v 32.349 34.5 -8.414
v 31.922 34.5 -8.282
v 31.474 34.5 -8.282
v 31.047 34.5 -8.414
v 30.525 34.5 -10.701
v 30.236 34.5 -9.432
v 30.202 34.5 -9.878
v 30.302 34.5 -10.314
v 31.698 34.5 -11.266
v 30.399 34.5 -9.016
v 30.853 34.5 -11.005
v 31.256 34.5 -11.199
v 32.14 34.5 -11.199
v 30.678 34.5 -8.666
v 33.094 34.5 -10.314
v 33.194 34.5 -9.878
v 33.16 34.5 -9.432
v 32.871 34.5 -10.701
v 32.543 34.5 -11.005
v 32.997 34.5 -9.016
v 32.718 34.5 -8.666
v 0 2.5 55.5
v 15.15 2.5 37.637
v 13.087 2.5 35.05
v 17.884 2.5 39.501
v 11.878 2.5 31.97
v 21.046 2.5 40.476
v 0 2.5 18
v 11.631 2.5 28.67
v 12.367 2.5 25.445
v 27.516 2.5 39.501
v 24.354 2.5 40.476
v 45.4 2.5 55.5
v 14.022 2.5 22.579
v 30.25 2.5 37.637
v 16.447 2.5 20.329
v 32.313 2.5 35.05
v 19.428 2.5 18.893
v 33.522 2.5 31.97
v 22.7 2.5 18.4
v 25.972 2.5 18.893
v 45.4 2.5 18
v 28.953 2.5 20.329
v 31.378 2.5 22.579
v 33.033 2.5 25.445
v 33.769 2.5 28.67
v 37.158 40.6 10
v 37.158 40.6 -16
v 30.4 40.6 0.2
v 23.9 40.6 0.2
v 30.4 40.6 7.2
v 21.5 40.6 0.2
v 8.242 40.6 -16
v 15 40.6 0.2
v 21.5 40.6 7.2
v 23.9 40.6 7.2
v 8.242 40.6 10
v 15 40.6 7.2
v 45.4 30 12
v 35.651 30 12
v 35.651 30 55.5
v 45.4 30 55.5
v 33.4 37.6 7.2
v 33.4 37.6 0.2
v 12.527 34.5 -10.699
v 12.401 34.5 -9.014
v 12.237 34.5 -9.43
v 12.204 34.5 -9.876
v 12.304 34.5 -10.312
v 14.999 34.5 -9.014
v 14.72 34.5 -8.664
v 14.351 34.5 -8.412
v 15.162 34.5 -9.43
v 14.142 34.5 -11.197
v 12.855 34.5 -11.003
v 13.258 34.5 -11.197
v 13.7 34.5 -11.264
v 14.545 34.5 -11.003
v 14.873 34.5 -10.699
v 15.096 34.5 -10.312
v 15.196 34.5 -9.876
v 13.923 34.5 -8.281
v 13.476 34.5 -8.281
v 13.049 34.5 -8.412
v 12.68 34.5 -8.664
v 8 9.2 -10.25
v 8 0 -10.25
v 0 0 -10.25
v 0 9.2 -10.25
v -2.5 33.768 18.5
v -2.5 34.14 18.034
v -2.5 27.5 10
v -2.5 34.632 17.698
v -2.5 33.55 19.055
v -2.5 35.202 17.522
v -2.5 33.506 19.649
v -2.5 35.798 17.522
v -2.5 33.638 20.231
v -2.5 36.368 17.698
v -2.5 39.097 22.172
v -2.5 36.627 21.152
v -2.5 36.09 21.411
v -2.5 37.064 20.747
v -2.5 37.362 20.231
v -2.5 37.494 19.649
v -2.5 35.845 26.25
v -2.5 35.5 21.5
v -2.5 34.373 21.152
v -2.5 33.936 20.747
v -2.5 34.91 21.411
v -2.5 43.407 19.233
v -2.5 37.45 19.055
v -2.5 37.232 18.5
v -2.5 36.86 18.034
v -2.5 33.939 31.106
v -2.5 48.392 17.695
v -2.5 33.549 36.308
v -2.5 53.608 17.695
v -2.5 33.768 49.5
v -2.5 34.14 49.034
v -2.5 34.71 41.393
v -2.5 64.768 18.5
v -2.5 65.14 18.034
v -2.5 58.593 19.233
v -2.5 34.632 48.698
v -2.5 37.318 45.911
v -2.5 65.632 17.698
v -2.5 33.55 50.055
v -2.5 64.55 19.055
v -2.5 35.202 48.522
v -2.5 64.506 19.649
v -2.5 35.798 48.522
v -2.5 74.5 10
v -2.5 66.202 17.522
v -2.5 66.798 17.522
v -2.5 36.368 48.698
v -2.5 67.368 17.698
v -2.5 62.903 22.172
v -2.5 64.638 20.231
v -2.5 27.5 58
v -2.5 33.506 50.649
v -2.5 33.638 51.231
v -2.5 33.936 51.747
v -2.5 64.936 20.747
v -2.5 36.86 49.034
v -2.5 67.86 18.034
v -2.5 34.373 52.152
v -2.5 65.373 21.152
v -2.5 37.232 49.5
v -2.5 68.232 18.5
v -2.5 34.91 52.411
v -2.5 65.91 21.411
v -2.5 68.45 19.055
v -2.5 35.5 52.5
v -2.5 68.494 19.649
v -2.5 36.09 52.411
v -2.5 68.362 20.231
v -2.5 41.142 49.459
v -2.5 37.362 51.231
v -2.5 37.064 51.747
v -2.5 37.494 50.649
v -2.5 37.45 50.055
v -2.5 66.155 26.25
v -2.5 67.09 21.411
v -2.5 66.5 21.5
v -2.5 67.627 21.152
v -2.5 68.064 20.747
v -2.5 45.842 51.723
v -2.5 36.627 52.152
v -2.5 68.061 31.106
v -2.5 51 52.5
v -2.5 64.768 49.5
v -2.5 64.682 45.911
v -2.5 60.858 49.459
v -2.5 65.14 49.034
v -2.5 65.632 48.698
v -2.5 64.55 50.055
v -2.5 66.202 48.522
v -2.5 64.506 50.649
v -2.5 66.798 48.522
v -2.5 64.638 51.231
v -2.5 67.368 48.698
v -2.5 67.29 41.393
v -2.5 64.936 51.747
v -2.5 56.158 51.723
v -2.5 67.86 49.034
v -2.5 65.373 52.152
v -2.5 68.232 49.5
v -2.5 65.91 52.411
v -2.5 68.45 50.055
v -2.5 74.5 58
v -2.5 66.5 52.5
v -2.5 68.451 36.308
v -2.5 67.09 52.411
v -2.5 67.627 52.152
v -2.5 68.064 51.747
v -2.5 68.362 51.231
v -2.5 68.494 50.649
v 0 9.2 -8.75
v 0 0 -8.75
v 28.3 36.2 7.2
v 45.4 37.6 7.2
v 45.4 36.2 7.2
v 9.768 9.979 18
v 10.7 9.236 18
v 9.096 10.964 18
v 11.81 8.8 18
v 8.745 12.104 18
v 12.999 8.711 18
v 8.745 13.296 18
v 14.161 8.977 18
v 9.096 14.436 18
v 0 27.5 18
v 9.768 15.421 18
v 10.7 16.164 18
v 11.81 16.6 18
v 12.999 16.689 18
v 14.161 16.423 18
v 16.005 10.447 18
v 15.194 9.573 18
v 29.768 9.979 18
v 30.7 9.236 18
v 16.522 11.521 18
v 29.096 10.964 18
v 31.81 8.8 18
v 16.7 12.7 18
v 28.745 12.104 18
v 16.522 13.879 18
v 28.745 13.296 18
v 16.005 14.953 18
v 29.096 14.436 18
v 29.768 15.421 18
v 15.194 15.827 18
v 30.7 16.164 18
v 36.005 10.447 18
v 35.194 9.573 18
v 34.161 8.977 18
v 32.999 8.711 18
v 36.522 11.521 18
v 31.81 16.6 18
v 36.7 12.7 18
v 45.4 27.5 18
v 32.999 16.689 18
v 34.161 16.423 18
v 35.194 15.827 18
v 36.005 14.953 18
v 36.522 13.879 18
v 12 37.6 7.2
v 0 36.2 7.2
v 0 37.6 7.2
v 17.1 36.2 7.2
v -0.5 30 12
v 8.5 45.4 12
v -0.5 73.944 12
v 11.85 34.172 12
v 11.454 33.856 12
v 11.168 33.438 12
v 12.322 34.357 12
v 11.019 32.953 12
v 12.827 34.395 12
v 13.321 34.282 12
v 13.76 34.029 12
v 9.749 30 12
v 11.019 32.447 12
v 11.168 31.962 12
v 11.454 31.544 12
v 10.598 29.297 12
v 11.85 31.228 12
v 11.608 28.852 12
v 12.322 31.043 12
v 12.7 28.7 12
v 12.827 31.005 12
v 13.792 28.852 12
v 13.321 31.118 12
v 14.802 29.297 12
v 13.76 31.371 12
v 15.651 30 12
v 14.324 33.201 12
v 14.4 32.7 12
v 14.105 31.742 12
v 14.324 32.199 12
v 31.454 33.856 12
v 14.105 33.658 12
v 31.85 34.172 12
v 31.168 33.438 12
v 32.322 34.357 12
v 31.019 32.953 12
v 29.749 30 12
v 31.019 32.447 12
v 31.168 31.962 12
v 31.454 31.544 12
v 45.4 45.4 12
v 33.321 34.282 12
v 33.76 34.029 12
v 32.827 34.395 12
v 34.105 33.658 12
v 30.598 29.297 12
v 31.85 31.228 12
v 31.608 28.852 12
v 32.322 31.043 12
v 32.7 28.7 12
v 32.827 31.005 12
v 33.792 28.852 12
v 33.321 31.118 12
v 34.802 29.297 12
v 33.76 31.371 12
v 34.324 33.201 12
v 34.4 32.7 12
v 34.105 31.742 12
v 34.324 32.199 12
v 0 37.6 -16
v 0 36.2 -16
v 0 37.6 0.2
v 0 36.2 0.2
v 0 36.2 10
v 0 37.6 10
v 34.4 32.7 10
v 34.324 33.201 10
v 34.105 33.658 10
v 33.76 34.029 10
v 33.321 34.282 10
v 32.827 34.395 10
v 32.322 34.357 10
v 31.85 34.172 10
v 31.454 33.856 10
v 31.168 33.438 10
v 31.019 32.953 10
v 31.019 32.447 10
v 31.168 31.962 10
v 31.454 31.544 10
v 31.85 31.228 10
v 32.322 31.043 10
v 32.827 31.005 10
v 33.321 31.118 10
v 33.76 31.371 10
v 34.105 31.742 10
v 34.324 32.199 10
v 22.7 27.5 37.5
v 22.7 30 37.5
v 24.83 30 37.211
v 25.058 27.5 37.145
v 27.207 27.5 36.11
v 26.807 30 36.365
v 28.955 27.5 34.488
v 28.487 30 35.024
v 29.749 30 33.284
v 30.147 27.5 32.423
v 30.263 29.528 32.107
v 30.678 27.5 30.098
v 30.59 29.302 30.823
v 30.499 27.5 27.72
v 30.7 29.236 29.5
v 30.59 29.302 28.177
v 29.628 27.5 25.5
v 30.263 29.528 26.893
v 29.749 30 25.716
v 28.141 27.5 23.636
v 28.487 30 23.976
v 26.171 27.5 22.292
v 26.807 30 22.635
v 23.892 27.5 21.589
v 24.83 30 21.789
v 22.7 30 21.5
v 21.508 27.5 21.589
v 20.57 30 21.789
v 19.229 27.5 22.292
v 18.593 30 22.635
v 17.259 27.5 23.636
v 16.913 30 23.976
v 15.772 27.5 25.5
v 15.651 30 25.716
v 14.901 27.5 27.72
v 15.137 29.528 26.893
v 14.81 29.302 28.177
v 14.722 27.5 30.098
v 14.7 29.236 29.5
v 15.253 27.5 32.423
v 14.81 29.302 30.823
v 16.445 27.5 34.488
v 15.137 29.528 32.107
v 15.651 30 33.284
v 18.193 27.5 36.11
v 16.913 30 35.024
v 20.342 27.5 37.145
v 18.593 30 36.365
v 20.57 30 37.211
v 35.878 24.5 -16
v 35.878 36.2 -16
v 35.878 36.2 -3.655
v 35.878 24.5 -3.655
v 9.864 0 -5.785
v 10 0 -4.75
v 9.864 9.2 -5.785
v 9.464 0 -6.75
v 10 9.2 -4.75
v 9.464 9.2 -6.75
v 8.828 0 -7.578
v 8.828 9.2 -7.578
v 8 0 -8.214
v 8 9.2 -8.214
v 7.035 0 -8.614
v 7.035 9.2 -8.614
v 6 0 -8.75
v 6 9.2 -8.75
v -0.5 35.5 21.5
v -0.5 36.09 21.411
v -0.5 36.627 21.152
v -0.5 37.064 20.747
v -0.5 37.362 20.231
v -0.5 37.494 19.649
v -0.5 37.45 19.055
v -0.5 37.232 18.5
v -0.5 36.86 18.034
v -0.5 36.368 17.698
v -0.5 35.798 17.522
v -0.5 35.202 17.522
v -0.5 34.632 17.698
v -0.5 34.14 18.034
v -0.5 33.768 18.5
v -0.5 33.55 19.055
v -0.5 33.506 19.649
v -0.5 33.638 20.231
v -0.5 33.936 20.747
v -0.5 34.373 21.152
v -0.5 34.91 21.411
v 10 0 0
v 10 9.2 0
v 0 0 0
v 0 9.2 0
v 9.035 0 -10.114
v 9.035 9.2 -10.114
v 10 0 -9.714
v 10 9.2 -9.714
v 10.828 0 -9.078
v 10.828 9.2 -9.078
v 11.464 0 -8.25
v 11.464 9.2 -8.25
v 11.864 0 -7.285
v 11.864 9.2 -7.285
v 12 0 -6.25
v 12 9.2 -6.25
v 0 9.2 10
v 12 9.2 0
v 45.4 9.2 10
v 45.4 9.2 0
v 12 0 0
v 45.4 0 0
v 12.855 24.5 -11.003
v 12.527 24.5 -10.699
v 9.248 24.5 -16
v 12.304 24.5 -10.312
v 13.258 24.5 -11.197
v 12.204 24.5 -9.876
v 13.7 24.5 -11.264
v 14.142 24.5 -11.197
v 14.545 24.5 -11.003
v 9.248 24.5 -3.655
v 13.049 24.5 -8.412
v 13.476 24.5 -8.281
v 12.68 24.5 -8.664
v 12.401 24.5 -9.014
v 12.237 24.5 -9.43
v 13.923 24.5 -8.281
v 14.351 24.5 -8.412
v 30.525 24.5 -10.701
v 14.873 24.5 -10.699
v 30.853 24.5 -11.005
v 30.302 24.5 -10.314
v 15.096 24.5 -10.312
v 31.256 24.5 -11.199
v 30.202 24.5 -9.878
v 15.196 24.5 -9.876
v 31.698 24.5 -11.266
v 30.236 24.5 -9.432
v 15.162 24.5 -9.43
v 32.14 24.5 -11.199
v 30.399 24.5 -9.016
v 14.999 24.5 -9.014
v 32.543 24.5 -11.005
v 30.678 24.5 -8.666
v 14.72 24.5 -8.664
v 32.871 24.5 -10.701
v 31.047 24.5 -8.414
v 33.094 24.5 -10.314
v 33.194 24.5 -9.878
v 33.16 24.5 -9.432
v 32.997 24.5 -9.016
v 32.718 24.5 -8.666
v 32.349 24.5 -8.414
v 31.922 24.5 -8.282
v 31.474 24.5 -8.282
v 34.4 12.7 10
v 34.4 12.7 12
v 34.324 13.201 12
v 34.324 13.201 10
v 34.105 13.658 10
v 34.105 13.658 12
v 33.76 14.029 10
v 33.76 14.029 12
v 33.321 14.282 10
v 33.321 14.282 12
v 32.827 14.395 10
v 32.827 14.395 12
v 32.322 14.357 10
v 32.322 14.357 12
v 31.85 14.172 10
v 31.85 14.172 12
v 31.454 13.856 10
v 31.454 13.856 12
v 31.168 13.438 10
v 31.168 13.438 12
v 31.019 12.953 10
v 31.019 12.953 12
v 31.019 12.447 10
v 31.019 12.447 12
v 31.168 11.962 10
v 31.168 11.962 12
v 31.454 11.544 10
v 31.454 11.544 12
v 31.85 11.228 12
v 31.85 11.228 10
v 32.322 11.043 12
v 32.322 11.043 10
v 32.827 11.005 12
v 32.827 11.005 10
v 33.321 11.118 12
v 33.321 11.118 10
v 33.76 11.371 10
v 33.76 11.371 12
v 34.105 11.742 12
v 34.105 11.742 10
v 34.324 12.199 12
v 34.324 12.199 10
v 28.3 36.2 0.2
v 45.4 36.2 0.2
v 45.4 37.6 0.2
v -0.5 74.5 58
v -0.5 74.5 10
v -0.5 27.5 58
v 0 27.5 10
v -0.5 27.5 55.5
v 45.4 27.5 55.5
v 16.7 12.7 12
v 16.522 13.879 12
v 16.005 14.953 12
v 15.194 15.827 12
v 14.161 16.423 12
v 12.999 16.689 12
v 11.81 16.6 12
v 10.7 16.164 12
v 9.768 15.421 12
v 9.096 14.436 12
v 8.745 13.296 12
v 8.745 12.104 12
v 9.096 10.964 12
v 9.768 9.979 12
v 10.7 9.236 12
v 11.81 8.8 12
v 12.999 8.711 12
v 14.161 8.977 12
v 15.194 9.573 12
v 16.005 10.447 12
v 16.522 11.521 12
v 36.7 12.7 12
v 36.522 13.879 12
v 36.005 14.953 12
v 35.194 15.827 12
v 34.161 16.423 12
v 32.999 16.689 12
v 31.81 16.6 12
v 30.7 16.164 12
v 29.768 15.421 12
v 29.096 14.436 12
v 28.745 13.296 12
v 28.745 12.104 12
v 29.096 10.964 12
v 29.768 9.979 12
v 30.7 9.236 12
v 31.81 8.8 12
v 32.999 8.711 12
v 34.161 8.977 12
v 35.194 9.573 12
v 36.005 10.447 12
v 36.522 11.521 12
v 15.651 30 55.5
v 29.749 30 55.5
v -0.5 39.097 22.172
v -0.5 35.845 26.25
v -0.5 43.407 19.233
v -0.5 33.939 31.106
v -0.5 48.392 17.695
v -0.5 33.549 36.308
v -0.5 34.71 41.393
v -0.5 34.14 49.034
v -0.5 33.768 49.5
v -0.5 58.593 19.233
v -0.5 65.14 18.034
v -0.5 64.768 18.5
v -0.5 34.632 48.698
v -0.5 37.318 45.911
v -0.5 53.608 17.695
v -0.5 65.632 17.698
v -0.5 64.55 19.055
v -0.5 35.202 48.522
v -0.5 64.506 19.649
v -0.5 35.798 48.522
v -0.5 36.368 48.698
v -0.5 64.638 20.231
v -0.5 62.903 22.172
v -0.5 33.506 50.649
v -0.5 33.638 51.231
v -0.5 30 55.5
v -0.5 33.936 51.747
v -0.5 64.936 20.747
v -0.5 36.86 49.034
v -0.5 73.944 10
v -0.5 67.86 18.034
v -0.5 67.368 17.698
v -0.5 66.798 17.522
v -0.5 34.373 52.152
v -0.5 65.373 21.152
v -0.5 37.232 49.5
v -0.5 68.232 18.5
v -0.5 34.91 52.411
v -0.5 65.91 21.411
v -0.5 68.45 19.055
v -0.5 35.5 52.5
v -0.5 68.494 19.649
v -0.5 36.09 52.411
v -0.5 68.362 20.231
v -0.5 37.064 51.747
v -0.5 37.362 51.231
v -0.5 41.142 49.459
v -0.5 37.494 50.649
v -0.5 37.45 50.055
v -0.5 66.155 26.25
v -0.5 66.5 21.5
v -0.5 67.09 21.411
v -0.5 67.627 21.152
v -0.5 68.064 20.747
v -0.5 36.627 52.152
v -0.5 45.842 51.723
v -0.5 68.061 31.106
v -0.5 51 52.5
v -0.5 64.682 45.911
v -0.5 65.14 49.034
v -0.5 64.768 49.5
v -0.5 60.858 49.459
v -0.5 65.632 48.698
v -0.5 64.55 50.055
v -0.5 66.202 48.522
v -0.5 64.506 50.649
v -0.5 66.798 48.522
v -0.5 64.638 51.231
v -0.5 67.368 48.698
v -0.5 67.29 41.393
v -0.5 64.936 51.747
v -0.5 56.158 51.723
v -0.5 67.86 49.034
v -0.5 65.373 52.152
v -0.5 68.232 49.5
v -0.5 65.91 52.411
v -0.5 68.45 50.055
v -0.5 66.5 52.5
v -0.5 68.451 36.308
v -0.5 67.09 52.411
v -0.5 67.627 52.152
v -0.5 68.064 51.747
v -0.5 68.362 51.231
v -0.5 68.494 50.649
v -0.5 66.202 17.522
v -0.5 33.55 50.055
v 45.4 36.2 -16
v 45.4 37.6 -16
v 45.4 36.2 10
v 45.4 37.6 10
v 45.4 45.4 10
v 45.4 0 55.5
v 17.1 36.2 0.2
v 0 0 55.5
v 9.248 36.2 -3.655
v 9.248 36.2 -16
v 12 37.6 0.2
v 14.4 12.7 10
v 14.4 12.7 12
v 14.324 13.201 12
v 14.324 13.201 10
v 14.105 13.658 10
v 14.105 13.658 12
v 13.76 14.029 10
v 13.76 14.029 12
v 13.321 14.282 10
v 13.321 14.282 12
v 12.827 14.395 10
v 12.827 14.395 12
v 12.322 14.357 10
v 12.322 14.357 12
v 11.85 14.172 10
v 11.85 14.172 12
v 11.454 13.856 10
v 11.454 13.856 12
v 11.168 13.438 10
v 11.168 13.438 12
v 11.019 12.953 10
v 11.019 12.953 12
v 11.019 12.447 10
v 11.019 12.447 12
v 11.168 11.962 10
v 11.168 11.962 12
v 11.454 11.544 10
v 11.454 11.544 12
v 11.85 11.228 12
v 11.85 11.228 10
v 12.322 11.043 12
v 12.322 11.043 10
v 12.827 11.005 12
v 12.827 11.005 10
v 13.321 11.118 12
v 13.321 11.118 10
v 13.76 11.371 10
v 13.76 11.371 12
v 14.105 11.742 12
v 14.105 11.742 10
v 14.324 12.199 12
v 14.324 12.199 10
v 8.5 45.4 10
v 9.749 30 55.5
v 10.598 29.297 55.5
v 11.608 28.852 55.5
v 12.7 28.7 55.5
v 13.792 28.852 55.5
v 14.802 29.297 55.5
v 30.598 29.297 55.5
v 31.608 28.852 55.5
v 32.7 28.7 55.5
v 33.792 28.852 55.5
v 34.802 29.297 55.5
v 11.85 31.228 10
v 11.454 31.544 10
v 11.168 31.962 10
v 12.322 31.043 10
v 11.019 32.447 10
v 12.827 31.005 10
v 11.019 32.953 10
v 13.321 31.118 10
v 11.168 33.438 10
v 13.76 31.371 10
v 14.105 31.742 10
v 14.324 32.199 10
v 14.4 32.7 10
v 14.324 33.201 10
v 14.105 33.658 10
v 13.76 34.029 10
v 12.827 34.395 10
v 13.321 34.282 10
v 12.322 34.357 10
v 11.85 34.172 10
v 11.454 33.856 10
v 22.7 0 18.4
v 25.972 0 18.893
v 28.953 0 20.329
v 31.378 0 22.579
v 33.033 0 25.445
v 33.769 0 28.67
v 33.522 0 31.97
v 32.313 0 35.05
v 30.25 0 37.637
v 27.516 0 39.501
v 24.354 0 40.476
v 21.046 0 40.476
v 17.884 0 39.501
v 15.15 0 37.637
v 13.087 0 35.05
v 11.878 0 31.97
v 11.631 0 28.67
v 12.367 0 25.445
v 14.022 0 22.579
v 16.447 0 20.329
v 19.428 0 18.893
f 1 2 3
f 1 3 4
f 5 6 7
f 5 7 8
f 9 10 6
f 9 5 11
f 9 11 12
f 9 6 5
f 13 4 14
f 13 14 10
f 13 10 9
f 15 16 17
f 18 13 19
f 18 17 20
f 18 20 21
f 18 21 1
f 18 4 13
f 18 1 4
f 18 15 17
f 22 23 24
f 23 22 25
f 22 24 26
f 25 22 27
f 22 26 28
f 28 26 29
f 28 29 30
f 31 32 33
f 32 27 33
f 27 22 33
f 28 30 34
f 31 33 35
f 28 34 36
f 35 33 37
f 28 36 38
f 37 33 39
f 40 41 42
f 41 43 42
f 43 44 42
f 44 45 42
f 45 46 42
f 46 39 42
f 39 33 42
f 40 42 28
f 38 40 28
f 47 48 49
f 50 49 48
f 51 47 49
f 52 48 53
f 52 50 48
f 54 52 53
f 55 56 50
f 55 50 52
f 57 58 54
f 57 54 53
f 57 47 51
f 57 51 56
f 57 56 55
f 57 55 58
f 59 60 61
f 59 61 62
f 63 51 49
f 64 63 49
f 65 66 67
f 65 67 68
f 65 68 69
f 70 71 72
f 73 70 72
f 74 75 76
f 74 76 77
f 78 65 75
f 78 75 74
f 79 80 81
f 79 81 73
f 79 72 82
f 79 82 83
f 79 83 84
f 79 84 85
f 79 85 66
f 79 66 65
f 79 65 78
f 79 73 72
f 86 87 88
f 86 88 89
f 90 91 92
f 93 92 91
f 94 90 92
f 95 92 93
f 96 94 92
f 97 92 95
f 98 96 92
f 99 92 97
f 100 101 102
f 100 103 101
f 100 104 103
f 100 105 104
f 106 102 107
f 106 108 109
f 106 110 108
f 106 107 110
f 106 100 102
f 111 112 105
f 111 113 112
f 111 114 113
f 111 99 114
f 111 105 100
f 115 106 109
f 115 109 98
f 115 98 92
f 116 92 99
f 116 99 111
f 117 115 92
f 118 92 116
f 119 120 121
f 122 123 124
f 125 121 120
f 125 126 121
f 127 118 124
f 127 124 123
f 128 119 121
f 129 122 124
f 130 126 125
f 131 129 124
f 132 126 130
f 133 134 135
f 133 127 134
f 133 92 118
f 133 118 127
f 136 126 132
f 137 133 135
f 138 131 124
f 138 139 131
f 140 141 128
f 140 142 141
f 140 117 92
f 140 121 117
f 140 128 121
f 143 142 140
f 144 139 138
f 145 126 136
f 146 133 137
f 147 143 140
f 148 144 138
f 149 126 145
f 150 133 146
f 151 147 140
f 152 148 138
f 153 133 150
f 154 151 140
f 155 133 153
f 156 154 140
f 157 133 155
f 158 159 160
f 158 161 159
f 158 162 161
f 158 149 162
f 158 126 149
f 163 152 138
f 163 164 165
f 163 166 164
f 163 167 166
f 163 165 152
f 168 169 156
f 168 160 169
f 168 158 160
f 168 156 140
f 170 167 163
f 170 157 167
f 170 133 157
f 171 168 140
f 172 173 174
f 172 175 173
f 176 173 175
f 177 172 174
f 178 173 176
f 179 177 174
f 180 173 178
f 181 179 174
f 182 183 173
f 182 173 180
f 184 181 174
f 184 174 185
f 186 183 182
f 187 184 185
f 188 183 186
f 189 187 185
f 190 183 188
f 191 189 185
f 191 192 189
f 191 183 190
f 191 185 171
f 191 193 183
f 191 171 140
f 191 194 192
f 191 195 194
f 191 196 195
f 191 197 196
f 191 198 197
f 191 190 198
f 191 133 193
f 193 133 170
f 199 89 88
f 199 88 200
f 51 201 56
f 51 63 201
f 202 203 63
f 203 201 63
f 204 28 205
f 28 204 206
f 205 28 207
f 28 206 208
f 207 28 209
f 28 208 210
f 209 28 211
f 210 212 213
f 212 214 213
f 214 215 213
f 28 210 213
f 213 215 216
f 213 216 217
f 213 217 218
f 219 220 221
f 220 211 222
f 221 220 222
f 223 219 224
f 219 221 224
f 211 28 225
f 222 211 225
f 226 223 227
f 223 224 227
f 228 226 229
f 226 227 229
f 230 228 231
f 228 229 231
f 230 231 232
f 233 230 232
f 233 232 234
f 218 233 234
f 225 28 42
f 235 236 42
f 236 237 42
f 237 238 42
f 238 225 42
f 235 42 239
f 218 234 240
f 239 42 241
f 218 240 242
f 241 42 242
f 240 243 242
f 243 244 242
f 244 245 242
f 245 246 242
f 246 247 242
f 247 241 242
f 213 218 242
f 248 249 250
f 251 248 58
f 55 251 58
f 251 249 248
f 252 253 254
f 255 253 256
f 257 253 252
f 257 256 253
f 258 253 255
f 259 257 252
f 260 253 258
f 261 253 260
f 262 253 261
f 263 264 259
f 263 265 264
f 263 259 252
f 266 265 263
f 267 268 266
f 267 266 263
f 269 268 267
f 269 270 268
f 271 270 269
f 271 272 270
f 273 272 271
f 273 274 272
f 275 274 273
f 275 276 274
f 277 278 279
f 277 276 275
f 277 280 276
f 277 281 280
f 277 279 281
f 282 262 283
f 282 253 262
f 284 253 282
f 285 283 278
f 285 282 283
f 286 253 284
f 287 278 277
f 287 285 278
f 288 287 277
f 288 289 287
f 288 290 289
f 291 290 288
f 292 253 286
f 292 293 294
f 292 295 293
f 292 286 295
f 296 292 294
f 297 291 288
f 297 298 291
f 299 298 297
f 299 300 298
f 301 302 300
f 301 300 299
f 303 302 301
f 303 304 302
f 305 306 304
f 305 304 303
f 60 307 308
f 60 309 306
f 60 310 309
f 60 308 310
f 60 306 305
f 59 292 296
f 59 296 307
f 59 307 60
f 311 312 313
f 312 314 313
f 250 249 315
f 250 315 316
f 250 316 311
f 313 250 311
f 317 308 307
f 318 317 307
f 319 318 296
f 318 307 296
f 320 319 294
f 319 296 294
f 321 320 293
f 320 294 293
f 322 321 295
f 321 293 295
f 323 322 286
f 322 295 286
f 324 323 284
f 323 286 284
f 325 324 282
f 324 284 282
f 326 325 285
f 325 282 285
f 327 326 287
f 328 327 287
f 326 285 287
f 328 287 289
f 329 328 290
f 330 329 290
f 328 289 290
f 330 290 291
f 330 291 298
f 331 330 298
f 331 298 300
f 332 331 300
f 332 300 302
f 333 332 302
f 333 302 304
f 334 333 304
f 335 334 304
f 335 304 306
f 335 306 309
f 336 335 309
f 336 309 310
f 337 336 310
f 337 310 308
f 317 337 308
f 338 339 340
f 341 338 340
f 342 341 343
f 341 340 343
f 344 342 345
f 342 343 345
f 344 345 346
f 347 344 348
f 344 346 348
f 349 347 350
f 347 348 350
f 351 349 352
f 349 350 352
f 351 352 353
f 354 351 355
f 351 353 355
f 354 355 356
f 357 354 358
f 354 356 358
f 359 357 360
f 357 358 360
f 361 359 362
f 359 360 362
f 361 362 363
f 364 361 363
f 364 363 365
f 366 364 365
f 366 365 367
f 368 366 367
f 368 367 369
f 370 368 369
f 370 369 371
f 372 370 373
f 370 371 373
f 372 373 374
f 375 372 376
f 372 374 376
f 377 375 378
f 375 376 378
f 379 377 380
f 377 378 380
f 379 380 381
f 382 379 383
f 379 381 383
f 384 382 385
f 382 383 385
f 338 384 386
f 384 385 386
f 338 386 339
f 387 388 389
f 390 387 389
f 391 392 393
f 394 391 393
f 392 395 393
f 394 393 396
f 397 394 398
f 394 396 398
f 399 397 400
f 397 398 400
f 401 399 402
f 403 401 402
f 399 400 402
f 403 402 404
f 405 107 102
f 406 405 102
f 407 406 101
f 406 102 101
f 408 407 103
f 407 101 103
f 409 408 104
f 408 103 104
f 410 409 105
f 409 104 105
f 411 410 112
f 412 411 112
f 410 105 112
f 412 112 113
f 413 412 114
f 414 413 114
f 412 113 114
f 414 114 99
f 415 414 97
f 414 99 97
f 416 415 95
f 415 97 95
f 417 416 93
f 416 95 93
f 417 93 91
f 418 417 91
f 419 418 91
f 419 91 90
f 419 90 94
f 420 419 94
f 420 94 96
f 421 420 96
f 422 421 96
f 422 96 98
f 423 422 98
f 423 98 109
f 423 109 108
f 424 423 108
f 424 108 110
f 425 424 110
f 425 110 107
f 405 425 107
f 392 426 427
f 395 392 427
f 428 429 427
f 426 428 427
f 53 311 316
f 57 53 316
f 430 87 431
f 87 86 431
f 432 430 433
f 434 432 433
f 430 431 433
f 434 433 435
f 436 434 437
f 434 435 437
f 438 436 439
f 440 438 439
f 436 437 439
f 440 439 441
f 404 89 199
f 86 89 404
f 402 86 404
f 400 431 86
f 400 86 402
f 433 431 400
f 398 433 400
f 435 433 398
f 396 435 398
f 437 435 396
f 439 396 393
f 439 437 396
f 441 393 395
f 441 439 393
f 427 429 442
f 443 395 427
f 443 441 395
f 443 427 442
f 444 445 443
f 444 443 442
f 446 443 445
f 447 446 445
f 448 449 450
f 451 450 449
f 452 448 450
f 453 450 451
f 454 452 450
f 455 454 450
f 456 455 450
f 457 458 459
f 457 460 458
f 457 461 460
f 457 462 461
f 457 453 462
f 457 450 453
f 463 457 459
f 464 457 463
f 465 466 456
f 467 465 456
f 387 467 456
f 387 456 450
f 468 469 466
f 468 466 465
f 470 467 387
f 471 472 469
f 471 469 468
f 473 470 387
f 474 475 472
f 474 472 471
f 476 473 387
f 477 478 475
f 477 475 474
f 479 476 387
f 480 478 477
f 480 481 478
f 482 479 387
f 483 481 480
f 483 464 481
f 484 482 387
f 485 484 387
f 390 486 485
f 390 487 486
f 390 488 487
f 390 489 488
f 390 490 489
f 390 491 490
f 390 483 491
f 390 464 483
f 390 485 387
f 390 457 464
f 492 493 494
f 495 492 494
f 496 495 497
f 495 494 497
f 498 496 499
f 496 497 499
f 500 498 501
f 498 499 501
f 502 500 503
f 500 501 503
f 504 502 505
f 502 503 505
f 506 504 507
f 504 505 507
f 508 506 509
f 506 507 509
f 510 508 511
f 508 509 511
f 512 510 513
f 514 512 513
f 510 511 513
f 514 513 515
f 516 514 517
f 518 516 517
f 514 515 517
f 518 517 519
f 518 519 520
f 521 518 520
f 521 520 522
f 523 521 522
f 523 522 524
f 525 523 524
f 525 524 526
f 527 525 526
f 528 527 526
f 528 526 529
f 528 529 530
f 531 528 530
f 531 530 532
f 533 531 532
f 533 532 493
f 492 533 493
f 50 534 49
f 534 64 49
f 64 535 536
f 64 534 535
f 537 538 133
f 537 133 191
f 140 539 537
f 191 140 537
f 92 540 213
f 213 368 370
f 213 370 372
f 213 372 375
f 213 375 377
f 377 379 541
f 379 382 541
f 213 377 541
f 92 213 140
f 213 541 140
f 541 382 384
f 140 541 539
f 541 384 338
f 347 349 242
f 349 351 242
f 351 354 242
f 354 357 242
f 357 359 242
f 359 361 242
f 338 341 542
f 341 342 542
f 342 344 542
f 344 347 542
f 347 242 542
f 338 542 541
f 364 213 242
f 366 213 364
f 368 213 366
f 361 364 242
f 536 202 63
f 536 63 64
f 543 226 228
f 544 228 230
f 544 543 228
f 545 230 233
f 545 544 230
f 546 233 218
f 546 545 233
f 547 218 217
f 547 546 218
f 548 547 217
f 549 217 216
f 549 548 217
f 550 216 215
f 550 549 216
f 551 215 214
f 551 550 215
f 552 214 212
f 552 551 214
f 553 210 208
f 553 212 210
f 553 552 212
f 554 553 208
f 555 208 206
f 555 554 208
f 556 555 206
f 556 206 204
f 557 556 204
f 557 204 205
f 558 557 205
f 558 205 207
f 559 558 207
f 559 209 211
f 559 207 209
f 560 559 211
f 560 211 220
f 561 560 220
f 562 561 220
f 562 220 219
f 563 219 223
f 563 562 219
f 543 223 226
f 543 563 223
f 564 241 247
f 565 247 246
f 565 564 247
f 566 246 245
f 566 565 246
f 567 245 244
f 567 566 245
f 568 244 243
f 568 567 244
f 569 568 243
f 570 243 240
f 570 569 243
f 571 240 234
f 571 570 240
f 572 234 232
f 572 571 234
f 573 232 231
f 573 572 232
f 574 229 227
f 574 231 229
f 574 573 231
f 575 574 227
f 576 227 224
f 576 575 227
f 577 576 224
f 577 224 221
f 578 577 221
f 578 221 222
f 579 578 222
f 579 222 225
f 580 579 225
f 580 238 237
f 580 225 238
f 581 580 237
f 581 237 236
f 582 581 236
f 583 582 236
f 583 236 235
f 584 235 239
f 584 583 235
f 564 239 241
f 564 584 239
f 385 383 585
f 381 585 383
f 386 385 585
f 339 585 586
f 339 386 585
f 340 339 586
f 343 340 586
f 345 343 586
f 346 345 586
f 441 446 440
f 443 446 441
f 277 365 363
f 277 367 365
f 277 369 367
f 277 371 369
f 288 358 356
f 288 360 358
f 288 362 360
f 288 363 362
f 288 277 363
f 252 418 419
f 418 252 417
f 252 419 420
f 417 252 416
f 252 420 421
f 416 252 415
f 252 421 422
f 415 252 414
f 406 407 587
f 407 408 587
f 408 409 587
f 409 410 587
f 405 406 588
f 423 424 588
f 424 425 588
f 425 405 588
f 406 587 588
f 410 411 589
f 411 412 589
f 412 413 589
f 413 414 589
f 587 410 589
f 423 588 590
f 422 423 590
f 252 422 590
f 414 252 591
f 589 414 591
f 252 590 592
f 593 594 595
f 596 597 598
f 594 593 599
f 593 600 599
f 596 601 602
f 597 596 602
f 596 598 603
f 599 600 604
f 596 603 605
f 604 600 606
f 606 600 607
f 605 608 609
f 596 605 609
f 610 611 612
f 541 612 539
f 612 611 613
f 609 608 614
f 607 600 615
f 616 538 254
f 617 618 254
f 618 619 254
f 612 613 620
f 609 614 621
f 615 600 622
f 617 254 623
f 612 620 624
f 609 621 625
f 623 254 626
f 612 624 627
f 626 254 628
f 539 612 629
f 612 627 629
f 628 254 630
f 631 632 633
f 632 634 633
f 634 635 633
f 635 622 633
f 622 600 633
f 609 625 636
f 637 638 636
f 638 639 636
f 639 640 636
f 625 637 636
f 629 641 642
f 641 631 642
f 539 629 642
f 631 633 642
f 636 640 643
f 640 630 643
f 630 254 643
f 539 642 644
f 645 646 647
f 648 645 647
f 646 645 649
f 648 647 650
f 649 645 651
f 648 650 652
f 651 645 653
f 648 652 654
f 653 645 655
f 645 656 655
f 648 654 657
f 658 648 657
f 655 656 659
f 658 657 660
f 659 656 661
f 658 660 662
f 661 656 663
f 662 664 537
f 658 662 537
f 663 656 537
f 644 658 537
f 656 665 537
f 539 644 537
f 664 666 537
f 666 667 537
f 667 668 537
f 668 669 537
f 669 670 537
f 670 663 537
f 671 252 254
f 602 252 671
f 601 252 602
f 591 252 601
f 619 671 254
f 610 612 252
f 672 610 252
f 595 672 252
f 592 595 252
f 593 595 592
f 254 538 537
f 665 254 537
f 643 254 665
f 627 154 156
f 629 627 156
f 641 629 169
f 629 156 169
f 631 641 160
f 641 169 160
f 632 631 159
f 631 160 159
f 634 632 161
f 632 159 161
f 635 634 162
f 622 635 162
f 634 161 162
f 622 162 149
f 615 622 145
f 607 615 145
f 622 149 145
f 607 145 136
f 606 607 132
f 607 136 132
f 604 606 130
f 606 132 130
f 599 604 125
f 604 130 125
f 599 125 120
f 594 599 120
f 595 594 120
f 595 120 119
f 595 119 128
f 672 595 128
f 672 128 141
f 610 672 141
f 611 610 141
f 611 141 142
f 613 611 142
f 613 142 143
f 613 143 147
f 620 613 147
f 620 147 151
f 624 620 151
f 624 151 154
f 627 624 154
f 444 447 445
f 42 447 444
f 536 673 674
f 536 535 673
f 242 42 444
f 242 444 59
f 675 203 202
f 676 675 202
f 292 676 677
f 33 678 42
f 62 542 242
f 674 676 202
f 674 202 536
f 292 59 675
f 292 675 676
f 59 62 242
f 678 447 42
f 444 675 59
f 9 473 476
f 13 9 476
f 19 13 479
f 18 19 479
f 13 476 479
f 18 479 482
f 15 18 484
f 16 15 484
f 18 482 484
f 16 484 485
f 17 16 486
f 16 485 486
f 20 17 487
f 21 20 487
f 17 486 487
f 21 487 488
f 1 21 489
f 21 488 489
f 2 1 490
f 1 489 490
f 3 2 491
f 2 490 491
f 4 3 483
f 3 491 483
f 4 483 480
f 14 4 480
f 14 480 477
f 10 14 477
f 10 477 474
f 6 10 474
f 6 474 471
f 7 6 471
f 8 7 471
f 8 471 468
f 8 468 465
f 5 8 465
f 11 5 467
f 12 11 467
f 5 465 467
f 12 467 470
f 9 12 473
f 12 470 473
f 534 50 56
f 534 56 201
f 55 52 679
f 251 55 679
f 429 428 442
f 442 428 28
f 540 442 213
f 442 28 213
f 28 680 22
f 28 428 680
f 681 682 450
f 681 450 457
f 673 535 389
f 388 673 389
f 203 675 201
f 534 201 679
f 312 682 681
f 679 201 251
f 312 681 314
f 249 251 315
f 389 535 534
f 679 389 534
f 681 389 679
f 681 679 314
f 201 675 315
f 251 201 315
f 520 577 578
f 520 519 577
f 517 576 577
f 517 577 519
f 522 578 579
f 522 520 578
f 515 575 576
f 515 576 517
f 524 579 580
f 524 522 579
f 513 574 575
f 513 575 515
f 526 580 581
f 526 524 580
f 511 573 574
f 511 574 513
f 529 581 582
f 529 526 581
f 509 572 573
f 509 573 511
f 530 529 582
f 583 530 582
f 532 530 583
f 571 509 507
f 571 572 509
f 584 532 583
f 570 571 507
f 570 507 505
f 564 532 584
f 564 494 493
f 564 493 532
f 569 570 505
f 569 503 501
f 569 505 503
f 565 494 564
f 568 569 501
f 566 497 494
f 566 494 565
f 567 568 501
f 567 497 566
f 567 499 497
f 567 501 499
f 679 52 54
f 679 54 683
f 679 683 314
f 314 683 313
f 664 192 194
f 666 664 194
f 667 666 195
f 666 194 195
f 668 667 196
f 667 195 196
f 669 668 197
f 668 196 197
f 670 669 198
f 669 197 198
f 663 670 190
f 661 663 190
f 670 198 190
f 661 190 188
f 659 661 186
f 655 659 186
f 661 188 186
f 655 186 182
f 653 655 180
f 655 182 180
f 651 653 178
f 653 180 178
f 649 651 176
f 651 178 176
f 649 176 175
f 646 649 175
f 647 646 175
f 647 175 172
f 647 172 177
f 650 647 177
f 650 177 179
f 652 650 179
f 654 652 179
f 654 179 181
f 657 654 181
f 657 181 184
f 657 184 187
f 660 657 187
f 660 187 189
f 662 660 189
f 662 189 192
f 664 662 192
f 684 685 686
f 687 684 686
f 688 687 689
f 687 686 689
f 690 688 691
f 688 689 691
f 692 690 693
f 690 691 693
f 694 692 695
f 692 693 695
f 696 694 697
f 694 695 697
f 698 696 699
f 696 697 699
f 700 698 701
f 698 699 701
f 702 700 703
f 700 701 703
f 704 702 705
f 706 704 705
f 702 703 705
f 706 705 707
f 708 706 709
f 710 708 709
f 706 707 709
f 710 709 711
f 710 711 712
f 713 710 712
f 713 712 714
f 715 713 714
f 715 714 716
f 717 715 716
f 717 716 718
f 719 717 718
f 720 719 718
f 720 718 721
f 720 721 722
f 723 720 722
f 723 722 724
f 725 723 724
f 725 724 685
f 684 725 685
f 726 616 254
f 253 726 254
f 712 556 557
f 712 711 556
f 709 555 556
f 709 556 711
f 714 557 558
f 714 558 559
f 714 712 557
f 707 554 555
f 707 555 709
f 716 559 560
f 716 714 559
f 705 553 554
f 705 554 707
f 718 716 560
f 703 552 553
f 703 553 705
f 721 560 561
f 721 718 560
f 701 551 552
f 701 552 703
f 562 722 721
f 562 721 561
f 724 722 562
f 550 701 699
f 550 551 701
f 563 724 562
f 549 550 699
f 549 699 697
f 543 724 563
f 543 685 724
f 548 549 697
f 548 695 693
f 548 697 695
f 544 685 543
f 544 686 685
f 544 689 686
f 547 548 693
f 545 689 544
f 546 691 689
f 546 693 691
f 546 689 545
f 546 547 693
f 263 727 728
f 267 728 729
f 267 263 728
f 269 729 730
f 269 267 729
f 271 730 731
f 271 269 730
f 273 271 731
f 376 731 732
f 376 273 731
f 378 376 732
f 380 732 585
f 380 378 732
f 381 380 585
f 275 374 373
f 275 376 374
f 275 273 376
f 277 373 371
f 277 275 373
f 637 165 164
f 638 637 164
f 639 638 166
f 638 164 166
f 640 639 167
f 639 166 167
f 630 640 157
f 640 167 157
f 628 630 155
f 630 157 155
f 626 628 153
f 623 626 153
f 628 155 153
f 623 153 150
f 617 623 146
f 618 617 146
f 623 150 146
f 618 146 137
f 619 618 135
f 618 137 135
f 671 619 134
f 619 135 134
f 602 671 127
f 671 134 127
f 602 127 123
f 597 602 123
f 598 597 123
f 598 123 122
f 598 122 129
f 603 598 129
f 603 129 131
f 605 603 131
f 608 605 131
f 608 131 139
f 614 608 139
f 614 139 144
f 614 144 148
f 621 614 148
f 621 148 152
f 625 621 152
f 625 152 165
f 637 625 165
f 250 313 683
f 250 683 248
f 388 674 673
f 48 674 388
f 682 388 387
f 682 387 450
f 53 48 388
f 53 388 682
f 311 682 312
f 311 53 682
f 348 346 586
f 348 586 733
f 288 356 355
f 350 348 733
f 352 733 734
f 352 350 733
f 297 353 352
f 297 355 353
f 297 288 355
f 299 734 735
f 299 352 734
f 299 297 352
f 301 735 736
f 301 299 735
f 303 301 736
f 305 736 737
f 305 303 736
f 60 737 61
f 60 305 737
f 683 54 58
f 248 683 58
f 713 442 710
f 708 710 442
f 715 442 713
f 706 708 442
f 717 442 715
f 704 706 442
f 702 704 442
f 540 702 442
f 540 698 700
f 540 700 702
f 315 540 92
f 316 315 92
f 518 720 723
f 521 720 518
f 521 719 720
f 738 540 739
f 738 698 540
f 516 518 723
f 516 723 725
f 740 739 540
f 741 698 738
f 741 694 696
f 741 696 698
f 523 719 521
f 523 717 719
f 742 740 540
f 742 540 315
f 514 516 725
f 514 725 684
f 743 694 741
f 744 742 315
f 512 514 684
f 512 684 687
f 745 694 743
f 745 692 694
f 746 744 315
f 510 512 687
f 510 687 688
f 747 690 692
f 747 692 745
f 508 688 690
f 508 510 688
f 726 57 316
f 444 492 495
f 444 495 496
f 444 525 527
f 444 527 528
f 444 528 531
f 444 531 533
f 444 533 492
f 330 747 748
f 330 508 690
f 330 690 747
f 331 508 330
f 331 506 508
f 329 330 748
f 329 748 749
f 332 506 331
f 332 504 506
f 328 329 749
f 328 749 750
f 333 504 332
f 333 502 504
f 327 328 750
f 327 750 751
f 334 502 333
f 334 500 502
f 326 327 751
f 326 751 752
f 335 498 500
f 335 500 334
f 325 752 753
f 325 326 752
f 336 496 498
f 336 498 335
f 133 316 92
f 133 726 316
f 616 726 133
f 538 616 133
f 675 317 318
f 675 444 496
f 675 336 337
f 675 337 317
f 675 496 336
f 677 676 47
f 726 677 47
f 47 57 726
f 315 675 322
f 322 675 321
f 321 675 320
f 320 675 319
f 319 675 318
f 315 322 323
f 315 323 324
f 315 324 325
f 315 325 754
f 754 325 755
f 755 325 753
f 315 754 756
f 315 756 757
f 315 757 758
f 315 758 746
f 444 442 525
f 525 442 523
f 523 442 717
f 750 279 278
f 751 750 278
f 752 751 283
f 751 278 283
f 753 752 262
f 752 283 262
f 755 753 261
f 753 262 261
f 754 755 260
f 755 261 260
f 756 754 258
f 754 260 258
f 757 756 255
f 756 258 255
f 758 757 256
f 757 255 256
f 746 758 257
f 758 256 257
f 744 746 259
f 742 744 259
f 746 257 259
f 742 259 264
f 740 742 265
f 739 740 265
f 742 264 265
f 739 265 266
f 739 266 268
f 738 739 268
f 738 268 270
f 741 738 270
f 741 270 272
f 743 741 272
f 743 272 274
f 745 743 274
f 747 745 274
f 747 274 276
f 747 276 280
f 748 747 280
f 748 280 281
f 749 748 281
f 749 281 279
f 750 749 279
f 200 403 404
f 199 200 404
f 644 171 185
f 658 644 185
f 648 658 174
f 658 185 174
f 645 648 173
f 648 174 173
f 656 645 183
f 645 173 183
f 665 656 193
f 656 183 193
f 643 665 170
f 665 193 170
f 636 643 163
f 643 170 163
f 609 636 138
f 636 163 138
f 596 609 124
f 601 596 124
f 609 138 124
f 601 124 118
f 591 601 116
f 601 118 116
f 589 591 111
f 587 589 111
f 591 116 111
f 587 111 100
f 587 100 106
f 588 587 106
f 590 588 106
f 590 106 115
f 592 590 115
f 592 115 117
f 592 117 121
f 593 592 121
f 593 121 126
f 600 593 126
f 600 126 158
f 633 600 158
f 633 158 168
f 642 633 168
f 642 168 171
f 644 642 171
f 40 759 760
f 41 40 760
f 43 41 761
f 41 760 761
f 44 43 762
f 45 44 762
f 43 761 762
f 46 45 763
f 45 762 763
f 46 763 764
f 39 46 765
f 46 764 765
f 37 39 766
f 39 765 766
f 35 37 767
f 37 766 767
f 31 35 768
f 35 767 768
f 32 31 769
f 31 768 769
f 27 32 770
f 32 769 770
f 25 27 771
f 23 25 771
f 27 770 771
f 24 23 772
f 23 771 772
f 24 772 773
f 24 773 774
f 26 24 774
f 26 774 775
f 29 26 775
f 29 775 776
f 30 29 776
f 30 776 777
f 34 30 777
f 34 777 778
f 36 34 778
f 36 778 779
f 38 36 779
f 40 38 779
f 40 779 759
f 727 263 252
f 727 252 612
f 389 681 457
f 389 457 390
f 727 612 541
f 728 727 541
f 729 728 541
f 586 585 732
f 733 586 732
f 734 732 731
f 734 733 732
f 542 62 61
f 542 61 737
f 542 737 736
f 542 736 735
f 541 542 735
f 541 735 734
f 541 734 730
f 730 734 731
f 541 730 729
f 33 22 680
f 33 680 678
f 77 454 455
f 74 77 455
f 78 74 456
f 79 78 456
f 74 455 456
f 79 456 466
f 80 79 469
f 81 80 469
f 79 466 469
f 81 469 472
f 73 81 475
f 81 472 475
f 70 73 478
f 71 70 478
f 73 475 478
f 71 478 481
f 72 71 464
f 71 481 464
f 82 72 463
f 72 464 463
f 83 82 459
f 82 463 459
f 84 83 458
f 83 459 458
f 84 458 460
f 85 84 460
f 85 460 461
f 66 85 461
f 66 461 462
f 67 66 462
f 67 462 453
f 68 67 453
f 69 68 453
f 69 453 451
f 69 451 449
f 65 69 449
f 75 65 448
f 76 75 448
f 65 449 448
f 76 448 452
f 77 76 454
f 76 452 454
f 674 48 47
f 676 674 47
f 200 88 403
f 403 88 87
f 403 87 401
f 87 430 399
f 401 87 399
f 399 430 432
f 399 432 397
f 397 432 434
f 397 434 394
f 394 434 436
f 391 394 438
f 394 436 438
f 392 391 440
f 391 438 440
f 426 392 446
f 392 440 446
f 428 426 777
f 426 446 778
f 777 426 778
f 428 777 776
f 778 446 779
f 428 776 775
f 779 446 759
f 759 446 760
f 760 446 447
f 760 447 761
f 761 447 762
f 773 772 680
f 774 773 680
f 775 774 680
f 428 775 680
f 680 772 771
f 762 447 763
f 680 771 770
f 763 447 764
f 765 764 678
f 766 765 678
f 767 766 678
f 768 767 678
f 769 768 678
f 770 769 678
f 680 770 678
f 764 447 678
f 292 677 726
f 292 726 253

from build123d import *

# Parameters (mm, degrees)
SKETCH1_W                = 45.4
SKETCH1_H                = 45.4
BOSS_EXTRUDE1_DEPTH      = 12
SKETCH2_W                = 45.4
SKETCH2_H                = 27
CUT_EXTRUDE1_DEPTH       = 10
CUT_EXTRUDE4_REACH       = 67.317
SKETCH13_R               = 1.7
SKETCH20_W               = 7
SKETCH20_H               = 1.4
CUT_EXTRUDE10_DEPTH      = 15
SKETCH21_W               = 10
SKETCH21_H               = 4.8
CUT_EXTRUDE11_DEPTH      = 66.317072806
SKETCH22_W               = 7
SKETCH22_H               = 1.4
CUT_EXTRUDE12_DEPTH      = 15
SKETCH29_W               = 45.4
SKETCH29_H               = 30
BOSS_EXTRUDE6_DEPTH      = 43.5
SKETCH26_W               = 45.4
SKETCH26_H               = 4.4
BOSS_EXTRUDE4_DEPTH      = 16
CUT_EXTRUDE13_DEPTH      = 15
CUT_EXTRUDE13_DEPTH_BACK = 15
SKETCH23_W               = 2
SKETCH23_H               = 7
SKETCH17_R               = 4
CUT_EXTRUDE8_DEPTH       = 78.553658843
CHAMFER1_SIZE2           = 8.242432258
CHAMFER1_SIZE            = 3
CHAMFER2_SIZE2           = 3
CHAMFER2_SIZE            = 8.242432258
SKETCH24_W               = 2
SKETCH24_H               = 9.2
BOSS_EXTRUDE2_DEPTH      = 10.25
SKETCH25_W               = 1.5
SKETCH25_H               = 9.2
BOSS_EXTRUDE3_DEPTH      = 10
FILLET1_R                = 4
CHAMFER3_SIZE            = 3
CHAMFER4_SIZE            = 4.5
SKETCH27_W               = 26.630251868
SKETCH27_H               = 12.344948638
BOSS_EXTRUDE5_DEPTH      = 11.7
SKETCH36_W               = 37.5
SKETCH36_H               = 25
CUT_EXTRUDE18_DEPTH      = 85.867956261
SKETCH28_R               = 1.5
CUT_EXTRUDE14_DEPTH      = 10
SKETCH31_R               = 8
CUT_EXTRUDE15_DEPTH      = 35
SKETCH32_R               = 11.1
CUT_EXTRUDE16_DEPTH      = 27.5
BOSS_EXTRUDE7_DEPTH      = 0.5
SKETCH34_W               = 48
SKETCH34_H               = 47
BOSS_EXTRUDE8_DEPTH      = 2
SKETCH35_R               = 2
SKETCH35_R_2             = 17.5
CUT_EXTRUDE17_DEPTH      = 10
CHAMFER7_SIZE            = 9
CHAMFER7_SIZE2           = 28.544353221


# Some blends are built 0.0001 mm under size
with BuildPart() as part:
    # Sketch1 → Boss-Extrude1 (new body)
    with BuildSketch(Plane.XY):
        with Locations((22.7, 22.7)):
            Rectangle(SKETCH1_W, SKETCH1_H)
    extrude(amount=BOSS_EXTRUDE1_DEPTH)

    # Sketch2 → Cut-Extrude1 (cut)
    with BuildSketch(Plane(origin=(0, 0, 0), x_dir=(-1, 0, 0), z_dir=(0, 0, -1))):
        with Locations((-22.7, 22.7)):
            Rectangle(SKETCH2_W, SKETCH2_H)
    extrude(amount=-CUT_EXTRUDE1_DEPTH, mode=Mode.SUBTRACT)

    # Sketch13 → Cut-Extrude4 (cut, up to next)
    with BuildSketch(Plane.XY.offset(12), mode=Mode.PRIVATE) as cut_extrude4_sk1:
        with Locations((32.7, 32.7)):
            Circle(SKETCH13_R)
    cut_extrude4_tool1 = extrude(cut_extrude4_sk1.sketch, amount=-CUT_EXTRUDE4_REACH, mode=Mode.PRIVATE) & part.part
    # Sketch13 → Cut-Extrude4 (cut, up to next)
    with BuildSketch(Plane.XY.offset(12), mode=Mode.PRIVATE) as cut_extrude4_sk2:
        with Locations((12.7, 32.7)):
            Circle(SKETCH13_R)
    cut_extrude4_tool2 = extrude(cut_extrude4_sk2.sketch, amount=-CUT_EXTRUDE4_REACH, mode=Mode.PRIVATE) & part.part
    # Sketch13 → Cut-Extrude4 (cut, up to next)
    with BuildSketch(Plane.XY.offset(12), mode=Mode.PRIVATE) as cut_extrude4_sk3:
        with Locations((32.7, 12.7)):
            Circle(SKETCH13_R)
    cut_extrude4_tool3 = extrude(cut_extrude4_sk3.sketch, amount=-CUT_EXTRUDE4_REACH, mode=Mode.PRIVATE) & part.part
    # Sketch13 → Cut-Extrude4 (cut, up to next)
    with BuildSketch(Plane.XY.offset(12), mode=Mode.PRIVATE) as cut_extrude4_sk4:
        with Locations((12.7, 12.7)):
            Circle(SKETCH13_R)
    cut_extrude4_tool4 = extrude(cut_extrude4_sk4.sketch, amount=-CUT_EXTRUDE4_REACH, mode=Mode.PRIVATE) & part.part
    add(cut_extrude4_tool1.solids().sort_by_distance((32.7, 32.7, 12))[0], mode=Mode.SUBTRACT)
    add(cut_extrude4_tool2.solids().sort_by_distance((12.7, 32.7, 12))[0], mode=Mode.SUBTRACT)
    add(cut_extrude4_tool3.solids().sort_by_distance((32.7, 12.7, 12))[0], mode=Mode.SUBTRACT)
    add(cut_extrude4_tool4.solids().sort_by_distance((12.7, 12.7, 12))[0], mode=Mode.SUBTRACT)

    # Sketch20 → Cut-Extrude10 (cut)
    with BuildSketch(Plane(origin=(45.4, 0, 0), x_dir=(0, 0, -1), z_dir=(1, 0, 0))):
        with Locations((-3.7, 36.9)):
            Rectangle(SKETCH20_W, SKETCH20_H)
    extrude(amount=-CUT_EXTRUDE10_DEPTH, mode=Mode.SUBTRACT)

    # Sketch21 → Cut-Extrude11 (cut, through all)
    with BuildSketch(Plane(origin=(45.4, 0, 0), x_dir=(0, 0, -1), z_dir=(1, 0, 0))):
        with Locations((-5, 43)):
            Rectangle(SKETCH21_W, SKETCH21_H)
    extrude(amount=-CUT_EXTRUDE11_DEPTH, mode=Mode.SUBTRACT)

    # Sketch22 → Cut-Extrude12 (cut)
    with BuildSketch(Plane.ZY):
        with Locations((3.7, 36.9)):
            Rectangle(SKETCH22_W, SKETCH22_H)
    extrude(amount=-CUT_EXTRUDE12_DEPTH, mode=Mode.SUBTRACT)

    # Sketch29 → Boss-Extrude6 (add)
    with BuildSketch(Plane.XY.offset(12)):
        with Locations((22.7, 15)):
            Rectangle(SKETCH29_W, SKETCH29_H)
    extrude(amount=BOSS_EXTRUDE6_DEPTH)

    # Sketch26 → Boss-Extrude4 (add)
    with BuildSketch(Plane(origin=(0, 0, 0), x_dir=(-1, 0, 0), z_dir=(0, 0, -1))):
        with Locations((-22.7, 38.4)):
            Rectangle(SKETCH26_W, SKETCH26_H)
    extrude(amount=BOSS_EXTRUDE4_DEPTH)

    # Sketch23 → Cut-Extrude13 (cut, two sides: drawn at the far end of the back side and taken through both)
    with BuildSketch(Plane(origin=(0, 40.6, 0), x_dir=(1, 0, 0), z_dir=(0, 1, 0)).offset(-CUT_EXTRUDE13_DEPTH_BACK)):
        with Locations((29.4, -3.7)):
            Rectangle(SKETCH23_W, SKETCH23_H)
        with Locations((16, -3.7)):
            Rectangle(SKETCH23_W, SKETCH23_H)
    extrude(amount=CUT_EXTRUDE13_DEPTH + CUT_EXTRUDE13_DEPTH_BACK, mode=Mode.SUBTRACT)

    # Sketch17 → Cut-Extrude8 (cut, through all)
    with BuildSketch(Plane.XY.offset(12)):
        with Locations((12.7, 32.7)):
            Circle(SKETCH17_R)
        with Locations((32.7, 32.7)):
            Circle(SKETCH17_R)
        with Locations((32.7, 12.7)):
            Circle(SKETCH17_R)
        with Locations((12.7, 12.7)):
            Circle(SKETCH17_R)
    extrude(amount=CUT_EXTRUDE8_DEPTH, mode=Mode.SUBTRACT)

    # Chamfer1
    chamfer1_edges = [part.edges().sort_by_distance(p)[0] for p in [
        (45.4, 40.6, -3),
    ]]
    chamfer1_side = [part.faces().sort_by_distance(p)[0] for p in [
        (45.4, 40.54, -3),
    ]]
    chamfer(chamfer1_edges, length=CHAMFER1_SIZE - 0.0001, length2=CHAMFER1_SIZE2 - 0.0001, reference=chamfer1_side[0])  # a hair under: the kernel refuses the full size

    # Chamfer2
    chamfer2_edges = [part.edges().sort_by_distance(p)[0] for p in [
        (0, 40.6, -3),
    ]]
    chamfer2_side = [part.faces().sort_by_distance(p)[0] for p in [
        (0.06, 40.6, -3),
    ]]
    chamfer(chamfer2_edges, length=CHAMFER2_SIZE - 0.0001, length2=CHAMFER2_SIZE2 - 0.0001, reference=chamfer2_side[0])  # a hair under: the kernel refuses the full size

    # Sketch24 → Boss-Extrude2 (add)
    with BuildSketch(Plane(origin=(0, 0, 0), x_dir=(-1, 0, 0), z_dir=(0, 0, -1))):
        with Locations((-11, 4.6)):
            Rectangle(SKETCH24_W, SKETCH24_H)
    extrude(amount=BOSS_EXTRUDE2_DEPTH)

    # Sketch25 → Boss-Extrude3 (add)
    with BuildSketch(Plane.ZY.offset(-10)):
        with Locations((-9.5, 4.6)):
            Rectangle(SKETCH25_W, SKETCH25_H)
    extrude(amount=BOSS_EXTRUDE3_DEPTH)

    # Fillet1
    fillet1_edges = [part.edges().sort_by_distance(p)[0] for p in [
        (12, 4.6, -10.25),
        (10, 4.6, -8.75),
    ]]
    fillet(fillet1_edges, radius=FILLET1_R)

    # Chamfer3
    chamfer3_edges = [part.edges().sort_by_distance(p)[0] for p in [
        (15, 37.6, 3.7),
        (30.4, 37.6, 3.7),
    ]]
    chamfer(chamfer3_edges, length=CHAMFER3_SIZE - 0.0001)  # a hair under: the kernel refuses the full size

    # Chamfer4
    # the kernel refuses this chamfer: 4.5 mm, written as the material it takes off along each edge
    with BuildSketch(Plane(origin=(28.4, 40.6, 0.2), x_dir=(-0.9996219169112966, 0.027495876610586785, 0), z_dir=(0, 0, 1))) as chamfer4_piece_1:
        Polygon((CHAMFER4_SIZE * 0.999621916911, CHAMFER4_SIZE * 0.0274958766106), (-CHAMFER4_SIZE * 0.0274958766106, CHAMFER4_SIZE * 0.999621916911), (0, 0), align=None)
    extrude(amount=7, mode=Mode.SUBTRACT)
    with BuildSketch(Plane(origin=(17, 40.6, 0.2), x_dir=(0.9996219169112966, 0.027495876610586785, 0), z_dir=(0, 0, 1))) as chamfer4_piece_2:
        Polygon((CHAMFER4_SIZE * 0.999621916911, -CHAMFER4_SIZE * 0.0274958766106), (-CHAMFER4_SIZE * 0.0274958766106, -CHAMFER4_SIZE * 0.999621916911), (0, 0), align=None)
    extrude(amount=7, mode=Mode.SUBTRACT)

    # Sketch27 → Boss-Extrude5 (add)
    with BuildSketch(Plane.XZ.offset(-36.2)):
        with Locations((22.562894264, -9.827525681)):
            Rectangle(SKETCH27_W, SKETCH27_H)
    extrude(amount=BOSS_EXTRUDE5_DEPTH)

    # Sketch36 → Cut-Extrude18 (cut, through all)
    with BuildSketch(Plane(origin=(45.4, 0, 0), x_dir=(0, 0, -1), z_dir=(1, 0, 0))):
        with Locations((-36.75, 15)):
            Rectangle(SKETCH36_W, SKETCH36_H)
    extrude(amount=-CUT_EXTRUDE18_DEPTH, mode=Mode.SUBTRACT)

    # Sketch28 → Cut-Extrude14 (cut)
    with BuildSketch(Plane.XZ.offset(-24.5)):
        with Locations(Location((31.697973452, -9.765616126, 0), (0, 0, 270))):
            Circle(SKETCH28_R)
        with Locations(Location((13.699854881, -9.763930868, 0), (0, 0, 270))):
            Circle(SKETCH28_R)
    extrude(amount=-CUT_EXTRUDE14_DEPTH, mode=Mode.SUBTRACT)

    # Sketch31 → Cut-Extrude15 (cut)
    with BuildSketch(Plane(origin=(0, 30, 0), x_dir=(1, 0, 0), z_dir=(0, 1, 0))):
        with Locations(Location((22.7, -29.5, 0), (0, 0, 270))):
            Circle(SKETCH31_R)
    extrude(amount=-CUT_EXTRUDE15_DEPTH, mode=Mode.SUBTRACT)

    # Sketch32 → Cut-Extrude16 (cut)
    with BuildSketch(Plane.XZ):
        with Locations(Location((22.7, 29.5, 0), (0, 0, 270))):
            Circle(SKETCH32_R)
    extrude(amount=-CUT_EXTRUDE16_DEPTH, mode=Mode.SUBTRACT)

    # Sketch33 → Boss-Extrude7 (add)
    with BuildSketch(Plane.ZY):
        Polygon((10, 45.4), (12, 45.4), (12, 30), (55.5, 30), (55.5, 27.5), (10, 27.5), align=None)
    extrude(amount=BOSS_EXTRUDE7_DEPTH)

    # Sketch34 → Boss-Extrude8 (add)
    with BuildSketch(Plane.ZY.offset(0.5)):
        with Locations((34, 51)):
            Rectangle(SKETCH34_W, SKETCH34_H)
    extrude(amount=BOSS_EXTRUDE8_DEPTH)

    # Sketch35 → Cut-Extrude17 (cut)
    with BuildSketch(Plane.ZY.offset(2.5)):
        with Locations((19.5, 66.5)):
            Circle(SKETCH35_R)
        with Locations((50.5, 66.5)):
            Circle(SKETCH35_R)
        with Locations((50.5, 35.5)):
            Circle(SKETCH35_R)
        with Locations((19.5, 35.5)):
            Circle(SKETCH35_R)
        with Locations((35, 51)):
            Circle(SKETCH35_R_2)
    extrude(amount=-CUT_EXTRUDE17_DEPTH, mode=Mode.SUBTRACT)

    # Chamfer7
    chamfer7_edges = [part.edges().sort_by_distance(p)[0] for p in [
        (-0.5, 45.4, 11),
    ]]
    chamfer7_side = [part.faces().sort_by_distance(p)[0] for p in [
        (22.45, 45.4, 11),
    ]]
    chamfer(chamfer7_edges, length=CHAMFER7_SIZE, length2=CHAMFER7_SIZE2, reference=chamfer7_side[0])


solid = part.part
